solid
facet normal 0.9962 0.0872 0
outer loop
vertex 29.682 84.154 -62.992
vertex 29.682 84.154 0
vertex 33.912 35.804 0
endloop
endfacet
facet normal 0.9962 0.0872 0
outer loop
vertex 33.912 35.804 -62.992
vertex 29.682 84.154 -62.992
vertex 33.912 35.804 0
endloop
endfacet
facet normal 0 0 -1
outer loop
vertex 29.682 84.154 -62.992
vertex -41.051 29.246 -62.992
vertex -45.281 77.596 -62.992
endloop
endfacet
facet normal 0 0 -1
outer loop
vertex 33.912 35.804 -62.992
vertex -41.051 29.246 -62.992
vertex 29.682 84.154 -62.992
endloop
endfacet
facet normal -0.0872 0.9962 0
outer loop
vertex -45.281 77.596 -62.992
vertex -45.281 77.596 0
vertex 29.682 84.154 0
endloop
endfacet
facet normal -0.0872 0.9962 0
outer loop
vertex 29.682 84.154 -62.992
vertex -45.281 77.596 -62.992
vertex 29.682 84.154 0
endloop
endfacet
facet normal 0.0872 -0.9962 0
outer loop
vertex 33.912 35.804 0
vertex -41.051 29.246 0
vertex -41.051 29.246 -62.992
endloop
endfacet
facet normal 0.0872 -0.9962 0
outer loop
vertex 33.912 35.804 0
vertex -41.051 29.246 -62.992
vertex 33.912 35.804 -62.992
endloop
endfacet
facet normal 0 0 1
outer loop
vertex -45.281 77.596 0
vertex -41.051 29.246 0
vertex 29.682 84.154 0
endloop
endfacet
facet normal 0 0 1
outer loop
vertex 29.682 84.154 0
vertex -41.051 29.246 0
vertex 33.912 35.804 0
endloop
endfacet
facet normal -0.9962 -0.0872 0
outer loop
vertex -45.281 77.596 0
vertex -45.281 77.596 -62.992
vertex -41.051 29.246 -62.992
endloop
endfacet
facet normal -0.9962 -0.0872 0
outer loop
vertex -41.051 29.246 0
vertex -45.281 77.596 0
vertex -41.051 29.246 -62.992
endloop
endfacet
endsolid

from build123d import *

# Parameters (mm, degrees)
F0_W     = 75.2491950989
F0_H     = 48.5349902883
F1_DEPTH = 62.992
F2_ANGLE = 175
F3_ANGLE = -180


with BuildPart() as f1:
    # F0 (on Top) → F1 (new body)
    with BuildSketch(Plane.XY):
        with Locations((-3.7127323449, 11.5366871469)):
            Rectangle(F0_W, F0_H)
    extrude(amount=F1_DEPTH)


with BuildPart() as f1_1:
    # F2: moved
    add(f1.part.rotate(Axis((33.9118652046, 35.804182291, 31.496), (0, 0, -1)), F2_ANGLE))


with BuildPart() as f1_2:
    # F3: moved
    add(f1_1.part.rotate(Axis((31.7968136407, 59.9793322896, 0), (0.0871557427, -0.9961946981, 0)), F3_ANGLE))


solid = f1_2.part
